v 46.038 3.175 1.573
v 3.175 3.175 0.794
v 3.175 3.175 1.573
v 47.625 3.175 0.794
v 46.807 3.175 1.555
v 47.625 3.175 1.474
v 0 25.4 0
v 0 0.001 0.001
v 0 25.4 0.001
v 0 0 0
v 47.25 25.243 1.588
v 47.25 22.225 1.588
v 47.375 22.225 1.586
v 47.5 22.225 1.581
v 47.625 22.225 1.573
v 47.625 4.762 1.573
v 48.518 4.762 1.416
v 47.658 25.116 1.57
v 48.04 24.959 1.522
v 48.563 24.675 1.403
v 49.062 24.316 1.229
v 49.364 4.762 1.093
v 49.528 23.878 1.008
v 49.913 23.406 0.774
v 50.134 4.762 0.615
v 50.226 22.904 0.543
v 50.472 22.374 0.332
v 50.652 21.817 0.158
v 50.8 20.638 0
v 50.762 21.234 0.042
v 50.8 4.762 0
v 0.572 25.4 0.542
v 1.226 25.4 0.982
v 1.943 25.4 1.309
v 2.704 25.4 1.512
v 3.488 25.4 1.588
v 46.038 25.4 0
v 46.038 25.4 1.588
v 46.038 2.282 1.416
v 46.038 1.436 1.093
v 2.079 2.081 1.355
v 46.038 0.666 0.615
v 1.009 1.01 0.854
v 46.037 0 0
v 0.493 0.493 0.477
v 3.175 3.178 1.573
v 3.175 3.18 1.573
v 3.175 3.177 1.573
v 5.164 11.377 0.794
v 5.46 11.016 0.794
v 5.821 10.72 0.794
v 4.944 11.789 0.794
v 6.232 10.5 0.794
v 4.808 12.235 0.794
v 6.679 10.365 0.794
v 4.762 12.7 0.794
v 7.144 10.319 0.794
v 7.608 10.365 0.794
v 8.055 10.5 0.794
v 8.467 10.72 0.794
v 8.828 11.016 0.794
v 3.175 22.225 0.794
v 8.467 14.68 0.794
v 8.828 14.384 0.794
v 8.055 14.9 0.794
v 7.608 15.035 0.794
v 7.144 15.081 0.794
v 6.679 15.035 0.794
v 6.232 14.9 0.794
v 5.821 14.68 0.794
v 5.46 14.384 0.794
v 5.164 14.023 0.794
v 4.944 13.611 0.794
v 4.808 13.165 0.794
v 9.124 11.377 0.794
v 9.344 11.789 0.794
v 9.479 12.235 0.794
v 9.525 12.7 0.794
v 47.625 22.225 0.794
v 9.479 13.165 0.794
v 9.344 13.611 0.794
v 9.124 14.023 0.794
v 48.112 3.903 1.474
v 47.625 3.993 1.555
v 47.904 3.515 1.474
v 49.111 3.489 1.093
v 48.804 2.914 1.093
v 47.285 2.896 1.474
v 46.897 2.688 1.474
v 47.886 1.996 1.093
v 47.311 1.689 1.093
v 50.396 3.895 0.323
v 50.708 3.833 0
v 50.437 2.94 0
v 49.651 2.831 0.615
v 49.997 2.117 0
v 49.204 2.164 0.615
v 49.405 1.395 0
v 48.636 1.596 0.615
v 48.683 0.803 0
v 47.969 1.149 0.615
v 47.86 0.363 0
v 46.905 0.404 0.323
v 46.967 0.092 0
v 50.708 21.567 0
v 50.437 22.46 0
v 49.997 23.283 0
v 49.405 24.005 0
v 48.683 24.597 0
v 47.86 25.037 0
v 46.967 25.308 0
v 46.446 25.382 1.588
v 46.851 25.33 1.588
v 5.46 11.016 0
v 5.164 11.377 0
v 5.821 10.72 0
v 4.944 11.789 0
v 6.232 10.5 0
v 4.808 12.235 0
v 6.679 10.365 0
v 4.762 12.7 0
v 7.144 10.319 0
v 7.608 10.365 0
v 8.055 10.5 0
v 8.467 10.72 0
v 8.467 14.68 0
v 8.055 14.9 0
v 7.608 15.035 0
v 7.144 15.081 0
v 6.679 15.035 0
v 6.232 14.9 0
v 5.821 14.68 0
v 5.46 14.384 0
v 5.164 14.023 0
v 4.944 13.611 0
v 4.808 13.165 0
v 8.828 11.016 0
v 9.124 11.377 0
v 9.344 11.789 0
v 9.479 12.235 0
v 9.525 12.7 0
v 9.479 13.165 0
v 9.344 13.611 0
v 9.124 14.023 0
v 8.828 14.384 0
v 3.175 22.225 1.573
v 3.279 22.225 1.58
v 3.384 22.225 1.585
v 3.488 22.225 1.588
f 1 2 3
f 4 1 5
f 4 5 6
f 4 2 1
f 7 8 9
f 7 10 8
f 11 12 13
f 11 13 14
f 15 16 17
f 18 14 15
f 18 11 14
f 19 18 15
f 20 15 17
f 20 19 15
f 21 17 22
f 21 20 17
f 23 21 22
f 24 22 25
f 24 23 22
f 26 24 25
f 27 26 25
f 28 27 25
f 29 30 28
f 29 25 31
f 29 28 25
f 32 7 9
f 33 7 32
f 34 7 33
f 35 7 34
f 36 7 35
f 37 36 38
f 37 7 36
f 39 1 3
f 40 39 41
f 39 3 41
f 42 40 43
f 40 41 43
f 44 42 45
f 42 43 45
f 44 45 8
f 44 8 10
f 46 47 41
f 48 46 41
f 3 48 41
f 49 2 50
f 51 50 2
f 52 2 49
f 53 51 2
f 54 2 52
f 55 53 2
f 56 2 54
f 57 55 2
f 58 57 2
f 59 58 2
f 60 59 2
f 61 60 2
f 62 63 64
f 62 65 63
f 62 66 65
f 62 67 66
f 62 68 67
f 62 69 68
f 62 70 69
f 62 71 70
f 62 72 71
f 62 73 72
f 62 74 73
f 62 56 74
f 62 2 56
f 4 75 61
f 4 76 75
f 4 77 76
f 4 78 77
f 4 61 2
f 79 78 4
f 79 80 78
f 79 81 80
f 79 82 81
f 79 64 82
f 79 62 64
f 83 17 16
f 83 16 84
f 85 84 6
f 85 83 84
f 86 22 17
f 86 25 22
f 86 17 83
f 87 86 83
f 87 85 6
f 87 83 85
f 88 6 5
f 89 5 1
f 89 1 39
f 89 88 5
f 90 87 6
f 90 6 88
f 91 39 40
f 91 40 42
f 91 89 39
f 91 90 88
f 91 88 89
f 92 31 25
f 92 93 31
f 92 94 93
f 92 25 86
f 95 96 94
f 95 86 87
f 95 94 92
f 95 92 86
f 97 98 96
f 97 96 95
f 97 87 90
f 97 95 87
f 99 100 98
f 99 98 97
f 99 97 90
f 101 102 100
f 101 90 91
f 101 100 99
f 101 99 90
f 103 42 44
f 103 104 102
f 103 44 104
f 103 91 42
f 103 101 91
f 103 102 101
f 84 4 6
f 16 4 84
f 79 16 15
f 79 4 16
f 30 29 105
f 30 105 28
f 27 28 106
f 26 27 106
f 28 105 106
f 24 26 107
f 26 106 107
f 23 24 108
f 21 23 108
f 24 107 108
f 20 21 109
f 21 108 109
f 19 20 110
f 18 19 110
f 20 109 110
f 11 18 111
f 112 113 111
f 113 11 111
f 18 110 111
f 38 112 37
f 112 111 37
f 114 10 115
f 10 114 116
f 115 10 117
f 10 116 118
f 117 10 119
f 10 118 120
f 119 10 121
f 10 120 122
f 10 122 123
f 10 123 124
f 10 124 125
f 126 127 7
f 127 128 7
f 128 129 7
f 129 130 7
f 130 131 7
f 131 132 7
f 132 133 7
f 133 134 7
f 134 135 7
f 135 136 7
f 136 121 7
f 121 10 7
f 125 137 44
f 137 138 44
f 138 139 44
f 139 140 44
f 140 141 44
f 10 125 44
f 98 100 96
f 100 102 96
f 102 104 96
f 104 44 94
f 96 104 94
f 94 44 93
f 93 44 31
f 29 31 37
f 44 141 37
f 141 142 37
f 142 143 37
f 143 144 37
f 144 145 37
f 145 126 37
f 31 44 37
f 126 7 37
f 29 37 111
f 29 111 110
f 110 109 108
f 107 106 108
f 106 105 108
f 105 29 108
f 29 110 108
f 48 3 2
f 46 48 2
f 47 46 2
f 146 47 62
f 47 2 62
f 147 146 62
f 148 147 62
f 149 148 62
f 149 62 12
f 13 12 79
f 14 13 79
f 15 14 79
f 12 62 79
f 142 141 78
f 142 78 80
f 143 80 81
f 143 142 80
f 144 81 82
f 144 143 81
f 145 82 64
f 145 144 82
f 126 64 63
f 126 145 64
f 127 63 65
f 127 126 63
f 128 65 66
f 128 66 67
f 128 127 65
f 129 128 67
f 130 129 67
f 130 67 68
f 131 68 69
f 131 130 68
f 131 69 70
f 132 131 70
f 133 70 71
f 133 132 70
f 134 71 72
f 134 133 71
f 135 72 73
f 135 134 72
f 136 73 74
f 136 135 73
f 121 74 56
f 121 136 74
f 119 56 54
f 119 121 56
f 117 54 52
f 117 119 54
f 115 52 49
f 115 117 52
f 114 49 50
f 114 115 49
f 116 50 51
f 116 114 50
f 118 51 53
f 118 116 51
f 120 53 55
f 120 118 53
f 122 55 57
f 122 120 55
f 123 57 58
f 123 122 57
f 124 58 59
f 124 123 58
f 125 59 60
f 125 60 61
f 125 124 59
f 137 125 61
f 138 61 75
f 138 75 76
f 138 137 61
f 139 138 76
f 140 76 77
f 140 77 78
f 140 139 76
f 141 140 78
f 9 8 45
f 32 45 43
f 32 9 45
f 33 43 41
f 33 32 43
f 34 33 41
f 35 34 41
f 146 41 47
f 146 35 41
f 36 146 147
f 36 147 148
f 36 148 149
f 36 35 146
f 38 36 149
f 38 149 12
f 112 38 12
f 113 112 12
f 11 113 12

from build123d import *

# Parameters (mm, degrees)
F0_W        = 50.8
F0_H        = 25.4
F0_W_2      = 44.45
F0_H_2      = 19.05
F0_R        = 2.38125
F1_DEPTH    = 0.79375
F2_DEPTH    = 1.5875
F3_R        = 4.7625
F4_T1_DEPTH = 25.4
F4_T3_DEPTH = 54.9118947857
F4_T5_DEPTH = 29.5118947857
F4_T8_ANGLE = 90
F5_T1_DEPTH = 39.6011909767


# Not quite as in the source:
# - a fillet or chamfer that OpenCascade refuses, or shapes differently, is made with other operations: its cross-section is extruded or revolved along the edge and cut away or added


with BuildPart() as f1:
    # F0 (on Top) → F1 (new body)
    with BuildSketch(Plane.XY):
        with Locations((25.4, 12.7)):
            Rectangle(F0_W, F0_H)
        with Locations((25.4, 12.7)):
            Rectangle(F0_W_2, F0_H_2, mode=Mode.SUBTRACT)
        with Locations((25.4, 12.7)):
            Rectangle(F0_W_2, F0_H_2)
        with Locations((7.14375, 12.7)):
            Circle(F0_R, mode=Mode.SUBTRACT)
    extrude(amount=F1_DEPTH)

    # F0 (on Top) → F2 (join)
    with BuildSketch(Plane.XY):
        with Locations((25.4, 12.7)):
            Rectangle(F0_W, F0_H)
        with Locations((25.4, 12.7)):
            Rectangle(F0_W_2, F0_H_2, mode=Mode.SUBTRACT)
    extrude(amount=F2_DEPTH)

    # F3
    f3_edges = [f1.edges().sort_by_distance(p)[0] for p in [
        (50.8, 0, 0.79375),
    ]]
    fillet(f3_edges, radius=F3_R)

    # F4: fillet of radius 4.7625 on 2 edges, made by hand

    # F4_s2 → F4_t1 (cut)
    with BuildSketch(Plane.XY.offset(-11.90625)):
        with BuildLine():
            ThreePointArc((50.8, 20.6375), (49.4050960454, 24.0050960454), (46.0375, 25.4))
            Line((46.0375, 25.4), (50.8, 25.4))
            Line((50.8, 25.4), (50.8, 20.6375))
        make_face()
    extrude(amount=F4_T1_DEPTH, mode=Mode.SUBTRACT)

    # F4_s4 → F4_t3 (cut)
    with BuildSketch(Plane.YZ.offset(-8.8743947857)):
        with BuildLine():
            ThreePointArc((3.5497579143, 1.5875), (1.6054754309, 1.1725478002), (0, 0))
            Line((0, 0), (0, 1.5875))
            Line((0, 1.5875), (3.5497579143, 1.5875))
        make_face()
    extrude(amount=F4_T3_DEPTH, mode=Mode.SUBTRACT)

    # F4_s6 → F4_t5 (cut)
    with BuildSketch(Plane.XZ.offset(-34.2743947857)):
        with BuildLine():
            ThreePointArc((47.2502420857, 1.5875), (49.1945245691, 1.1725478002), (50.8, 0))
            Line((50.8, 0), (50.8, 1.5875))
            Line((50.8, 1.5875), (47.2502420857, 1.5875))
        make_face()
    extrude(amount=F4_T5_DEPTH, mode=Mode.SUBTRACT)

    # F4_s7 → F4_t8 (revolve, cut)
    with BuildSketch(Plane.XZ.offset(-4.7625)):
        with BuildLine():
            ThreePointArc((47.2502420857, 1.5875), (49.1945245691, 1.1725478002), (50.8, 0))
            Line((50.8, 0), (50.8, 1.5875))
            Line((50.8, 1.5875), (47.2502420857, 1.5875))
        make_face()
    revolve(axis=Axis((46.0375, 4.7625, 1.5875), (0, 0, -1)), revolution_arc=F4_T8_ANGLE, mode=Mode.SUBTRACT)

    # F5: fillet of radius 4.7625 on 1 edges, made by hand

    # F5_s2 → F5_t1 (cut)
    with BuildSketch(Plane.XZ.offset(-34.2754744455)):
        with BuildLine():
            ThreePointArc((-0.0002981182, 0.0002666937), (1.6055468798, 1.1729169704), (3.5501897557, 1.5879))
            Line((3.5501897557, 1.5879), (3.5501897557, 2.0642865685))
            ThreePointArc((3.5501897557, 2.0642865685), (1.7750948778, 2.0638865685), (0, 2.0638865685))
            Line((0, 2.0638865685), (-0.4763865685, 1.5875))
            ThreePointArc((-0.4763865685, 1.5875), (-0.4763865685, 0.7938833468), (-0.3553469056, 0.3178899316))
            Line((-0.3553469056, 0.3178899316), (-0.0002981182, 0.0002666937))
        make_face()
    extrude(amount=F5_T1_DEPTH, mode=Mode.SUBTRACT)


solid = f1.part
